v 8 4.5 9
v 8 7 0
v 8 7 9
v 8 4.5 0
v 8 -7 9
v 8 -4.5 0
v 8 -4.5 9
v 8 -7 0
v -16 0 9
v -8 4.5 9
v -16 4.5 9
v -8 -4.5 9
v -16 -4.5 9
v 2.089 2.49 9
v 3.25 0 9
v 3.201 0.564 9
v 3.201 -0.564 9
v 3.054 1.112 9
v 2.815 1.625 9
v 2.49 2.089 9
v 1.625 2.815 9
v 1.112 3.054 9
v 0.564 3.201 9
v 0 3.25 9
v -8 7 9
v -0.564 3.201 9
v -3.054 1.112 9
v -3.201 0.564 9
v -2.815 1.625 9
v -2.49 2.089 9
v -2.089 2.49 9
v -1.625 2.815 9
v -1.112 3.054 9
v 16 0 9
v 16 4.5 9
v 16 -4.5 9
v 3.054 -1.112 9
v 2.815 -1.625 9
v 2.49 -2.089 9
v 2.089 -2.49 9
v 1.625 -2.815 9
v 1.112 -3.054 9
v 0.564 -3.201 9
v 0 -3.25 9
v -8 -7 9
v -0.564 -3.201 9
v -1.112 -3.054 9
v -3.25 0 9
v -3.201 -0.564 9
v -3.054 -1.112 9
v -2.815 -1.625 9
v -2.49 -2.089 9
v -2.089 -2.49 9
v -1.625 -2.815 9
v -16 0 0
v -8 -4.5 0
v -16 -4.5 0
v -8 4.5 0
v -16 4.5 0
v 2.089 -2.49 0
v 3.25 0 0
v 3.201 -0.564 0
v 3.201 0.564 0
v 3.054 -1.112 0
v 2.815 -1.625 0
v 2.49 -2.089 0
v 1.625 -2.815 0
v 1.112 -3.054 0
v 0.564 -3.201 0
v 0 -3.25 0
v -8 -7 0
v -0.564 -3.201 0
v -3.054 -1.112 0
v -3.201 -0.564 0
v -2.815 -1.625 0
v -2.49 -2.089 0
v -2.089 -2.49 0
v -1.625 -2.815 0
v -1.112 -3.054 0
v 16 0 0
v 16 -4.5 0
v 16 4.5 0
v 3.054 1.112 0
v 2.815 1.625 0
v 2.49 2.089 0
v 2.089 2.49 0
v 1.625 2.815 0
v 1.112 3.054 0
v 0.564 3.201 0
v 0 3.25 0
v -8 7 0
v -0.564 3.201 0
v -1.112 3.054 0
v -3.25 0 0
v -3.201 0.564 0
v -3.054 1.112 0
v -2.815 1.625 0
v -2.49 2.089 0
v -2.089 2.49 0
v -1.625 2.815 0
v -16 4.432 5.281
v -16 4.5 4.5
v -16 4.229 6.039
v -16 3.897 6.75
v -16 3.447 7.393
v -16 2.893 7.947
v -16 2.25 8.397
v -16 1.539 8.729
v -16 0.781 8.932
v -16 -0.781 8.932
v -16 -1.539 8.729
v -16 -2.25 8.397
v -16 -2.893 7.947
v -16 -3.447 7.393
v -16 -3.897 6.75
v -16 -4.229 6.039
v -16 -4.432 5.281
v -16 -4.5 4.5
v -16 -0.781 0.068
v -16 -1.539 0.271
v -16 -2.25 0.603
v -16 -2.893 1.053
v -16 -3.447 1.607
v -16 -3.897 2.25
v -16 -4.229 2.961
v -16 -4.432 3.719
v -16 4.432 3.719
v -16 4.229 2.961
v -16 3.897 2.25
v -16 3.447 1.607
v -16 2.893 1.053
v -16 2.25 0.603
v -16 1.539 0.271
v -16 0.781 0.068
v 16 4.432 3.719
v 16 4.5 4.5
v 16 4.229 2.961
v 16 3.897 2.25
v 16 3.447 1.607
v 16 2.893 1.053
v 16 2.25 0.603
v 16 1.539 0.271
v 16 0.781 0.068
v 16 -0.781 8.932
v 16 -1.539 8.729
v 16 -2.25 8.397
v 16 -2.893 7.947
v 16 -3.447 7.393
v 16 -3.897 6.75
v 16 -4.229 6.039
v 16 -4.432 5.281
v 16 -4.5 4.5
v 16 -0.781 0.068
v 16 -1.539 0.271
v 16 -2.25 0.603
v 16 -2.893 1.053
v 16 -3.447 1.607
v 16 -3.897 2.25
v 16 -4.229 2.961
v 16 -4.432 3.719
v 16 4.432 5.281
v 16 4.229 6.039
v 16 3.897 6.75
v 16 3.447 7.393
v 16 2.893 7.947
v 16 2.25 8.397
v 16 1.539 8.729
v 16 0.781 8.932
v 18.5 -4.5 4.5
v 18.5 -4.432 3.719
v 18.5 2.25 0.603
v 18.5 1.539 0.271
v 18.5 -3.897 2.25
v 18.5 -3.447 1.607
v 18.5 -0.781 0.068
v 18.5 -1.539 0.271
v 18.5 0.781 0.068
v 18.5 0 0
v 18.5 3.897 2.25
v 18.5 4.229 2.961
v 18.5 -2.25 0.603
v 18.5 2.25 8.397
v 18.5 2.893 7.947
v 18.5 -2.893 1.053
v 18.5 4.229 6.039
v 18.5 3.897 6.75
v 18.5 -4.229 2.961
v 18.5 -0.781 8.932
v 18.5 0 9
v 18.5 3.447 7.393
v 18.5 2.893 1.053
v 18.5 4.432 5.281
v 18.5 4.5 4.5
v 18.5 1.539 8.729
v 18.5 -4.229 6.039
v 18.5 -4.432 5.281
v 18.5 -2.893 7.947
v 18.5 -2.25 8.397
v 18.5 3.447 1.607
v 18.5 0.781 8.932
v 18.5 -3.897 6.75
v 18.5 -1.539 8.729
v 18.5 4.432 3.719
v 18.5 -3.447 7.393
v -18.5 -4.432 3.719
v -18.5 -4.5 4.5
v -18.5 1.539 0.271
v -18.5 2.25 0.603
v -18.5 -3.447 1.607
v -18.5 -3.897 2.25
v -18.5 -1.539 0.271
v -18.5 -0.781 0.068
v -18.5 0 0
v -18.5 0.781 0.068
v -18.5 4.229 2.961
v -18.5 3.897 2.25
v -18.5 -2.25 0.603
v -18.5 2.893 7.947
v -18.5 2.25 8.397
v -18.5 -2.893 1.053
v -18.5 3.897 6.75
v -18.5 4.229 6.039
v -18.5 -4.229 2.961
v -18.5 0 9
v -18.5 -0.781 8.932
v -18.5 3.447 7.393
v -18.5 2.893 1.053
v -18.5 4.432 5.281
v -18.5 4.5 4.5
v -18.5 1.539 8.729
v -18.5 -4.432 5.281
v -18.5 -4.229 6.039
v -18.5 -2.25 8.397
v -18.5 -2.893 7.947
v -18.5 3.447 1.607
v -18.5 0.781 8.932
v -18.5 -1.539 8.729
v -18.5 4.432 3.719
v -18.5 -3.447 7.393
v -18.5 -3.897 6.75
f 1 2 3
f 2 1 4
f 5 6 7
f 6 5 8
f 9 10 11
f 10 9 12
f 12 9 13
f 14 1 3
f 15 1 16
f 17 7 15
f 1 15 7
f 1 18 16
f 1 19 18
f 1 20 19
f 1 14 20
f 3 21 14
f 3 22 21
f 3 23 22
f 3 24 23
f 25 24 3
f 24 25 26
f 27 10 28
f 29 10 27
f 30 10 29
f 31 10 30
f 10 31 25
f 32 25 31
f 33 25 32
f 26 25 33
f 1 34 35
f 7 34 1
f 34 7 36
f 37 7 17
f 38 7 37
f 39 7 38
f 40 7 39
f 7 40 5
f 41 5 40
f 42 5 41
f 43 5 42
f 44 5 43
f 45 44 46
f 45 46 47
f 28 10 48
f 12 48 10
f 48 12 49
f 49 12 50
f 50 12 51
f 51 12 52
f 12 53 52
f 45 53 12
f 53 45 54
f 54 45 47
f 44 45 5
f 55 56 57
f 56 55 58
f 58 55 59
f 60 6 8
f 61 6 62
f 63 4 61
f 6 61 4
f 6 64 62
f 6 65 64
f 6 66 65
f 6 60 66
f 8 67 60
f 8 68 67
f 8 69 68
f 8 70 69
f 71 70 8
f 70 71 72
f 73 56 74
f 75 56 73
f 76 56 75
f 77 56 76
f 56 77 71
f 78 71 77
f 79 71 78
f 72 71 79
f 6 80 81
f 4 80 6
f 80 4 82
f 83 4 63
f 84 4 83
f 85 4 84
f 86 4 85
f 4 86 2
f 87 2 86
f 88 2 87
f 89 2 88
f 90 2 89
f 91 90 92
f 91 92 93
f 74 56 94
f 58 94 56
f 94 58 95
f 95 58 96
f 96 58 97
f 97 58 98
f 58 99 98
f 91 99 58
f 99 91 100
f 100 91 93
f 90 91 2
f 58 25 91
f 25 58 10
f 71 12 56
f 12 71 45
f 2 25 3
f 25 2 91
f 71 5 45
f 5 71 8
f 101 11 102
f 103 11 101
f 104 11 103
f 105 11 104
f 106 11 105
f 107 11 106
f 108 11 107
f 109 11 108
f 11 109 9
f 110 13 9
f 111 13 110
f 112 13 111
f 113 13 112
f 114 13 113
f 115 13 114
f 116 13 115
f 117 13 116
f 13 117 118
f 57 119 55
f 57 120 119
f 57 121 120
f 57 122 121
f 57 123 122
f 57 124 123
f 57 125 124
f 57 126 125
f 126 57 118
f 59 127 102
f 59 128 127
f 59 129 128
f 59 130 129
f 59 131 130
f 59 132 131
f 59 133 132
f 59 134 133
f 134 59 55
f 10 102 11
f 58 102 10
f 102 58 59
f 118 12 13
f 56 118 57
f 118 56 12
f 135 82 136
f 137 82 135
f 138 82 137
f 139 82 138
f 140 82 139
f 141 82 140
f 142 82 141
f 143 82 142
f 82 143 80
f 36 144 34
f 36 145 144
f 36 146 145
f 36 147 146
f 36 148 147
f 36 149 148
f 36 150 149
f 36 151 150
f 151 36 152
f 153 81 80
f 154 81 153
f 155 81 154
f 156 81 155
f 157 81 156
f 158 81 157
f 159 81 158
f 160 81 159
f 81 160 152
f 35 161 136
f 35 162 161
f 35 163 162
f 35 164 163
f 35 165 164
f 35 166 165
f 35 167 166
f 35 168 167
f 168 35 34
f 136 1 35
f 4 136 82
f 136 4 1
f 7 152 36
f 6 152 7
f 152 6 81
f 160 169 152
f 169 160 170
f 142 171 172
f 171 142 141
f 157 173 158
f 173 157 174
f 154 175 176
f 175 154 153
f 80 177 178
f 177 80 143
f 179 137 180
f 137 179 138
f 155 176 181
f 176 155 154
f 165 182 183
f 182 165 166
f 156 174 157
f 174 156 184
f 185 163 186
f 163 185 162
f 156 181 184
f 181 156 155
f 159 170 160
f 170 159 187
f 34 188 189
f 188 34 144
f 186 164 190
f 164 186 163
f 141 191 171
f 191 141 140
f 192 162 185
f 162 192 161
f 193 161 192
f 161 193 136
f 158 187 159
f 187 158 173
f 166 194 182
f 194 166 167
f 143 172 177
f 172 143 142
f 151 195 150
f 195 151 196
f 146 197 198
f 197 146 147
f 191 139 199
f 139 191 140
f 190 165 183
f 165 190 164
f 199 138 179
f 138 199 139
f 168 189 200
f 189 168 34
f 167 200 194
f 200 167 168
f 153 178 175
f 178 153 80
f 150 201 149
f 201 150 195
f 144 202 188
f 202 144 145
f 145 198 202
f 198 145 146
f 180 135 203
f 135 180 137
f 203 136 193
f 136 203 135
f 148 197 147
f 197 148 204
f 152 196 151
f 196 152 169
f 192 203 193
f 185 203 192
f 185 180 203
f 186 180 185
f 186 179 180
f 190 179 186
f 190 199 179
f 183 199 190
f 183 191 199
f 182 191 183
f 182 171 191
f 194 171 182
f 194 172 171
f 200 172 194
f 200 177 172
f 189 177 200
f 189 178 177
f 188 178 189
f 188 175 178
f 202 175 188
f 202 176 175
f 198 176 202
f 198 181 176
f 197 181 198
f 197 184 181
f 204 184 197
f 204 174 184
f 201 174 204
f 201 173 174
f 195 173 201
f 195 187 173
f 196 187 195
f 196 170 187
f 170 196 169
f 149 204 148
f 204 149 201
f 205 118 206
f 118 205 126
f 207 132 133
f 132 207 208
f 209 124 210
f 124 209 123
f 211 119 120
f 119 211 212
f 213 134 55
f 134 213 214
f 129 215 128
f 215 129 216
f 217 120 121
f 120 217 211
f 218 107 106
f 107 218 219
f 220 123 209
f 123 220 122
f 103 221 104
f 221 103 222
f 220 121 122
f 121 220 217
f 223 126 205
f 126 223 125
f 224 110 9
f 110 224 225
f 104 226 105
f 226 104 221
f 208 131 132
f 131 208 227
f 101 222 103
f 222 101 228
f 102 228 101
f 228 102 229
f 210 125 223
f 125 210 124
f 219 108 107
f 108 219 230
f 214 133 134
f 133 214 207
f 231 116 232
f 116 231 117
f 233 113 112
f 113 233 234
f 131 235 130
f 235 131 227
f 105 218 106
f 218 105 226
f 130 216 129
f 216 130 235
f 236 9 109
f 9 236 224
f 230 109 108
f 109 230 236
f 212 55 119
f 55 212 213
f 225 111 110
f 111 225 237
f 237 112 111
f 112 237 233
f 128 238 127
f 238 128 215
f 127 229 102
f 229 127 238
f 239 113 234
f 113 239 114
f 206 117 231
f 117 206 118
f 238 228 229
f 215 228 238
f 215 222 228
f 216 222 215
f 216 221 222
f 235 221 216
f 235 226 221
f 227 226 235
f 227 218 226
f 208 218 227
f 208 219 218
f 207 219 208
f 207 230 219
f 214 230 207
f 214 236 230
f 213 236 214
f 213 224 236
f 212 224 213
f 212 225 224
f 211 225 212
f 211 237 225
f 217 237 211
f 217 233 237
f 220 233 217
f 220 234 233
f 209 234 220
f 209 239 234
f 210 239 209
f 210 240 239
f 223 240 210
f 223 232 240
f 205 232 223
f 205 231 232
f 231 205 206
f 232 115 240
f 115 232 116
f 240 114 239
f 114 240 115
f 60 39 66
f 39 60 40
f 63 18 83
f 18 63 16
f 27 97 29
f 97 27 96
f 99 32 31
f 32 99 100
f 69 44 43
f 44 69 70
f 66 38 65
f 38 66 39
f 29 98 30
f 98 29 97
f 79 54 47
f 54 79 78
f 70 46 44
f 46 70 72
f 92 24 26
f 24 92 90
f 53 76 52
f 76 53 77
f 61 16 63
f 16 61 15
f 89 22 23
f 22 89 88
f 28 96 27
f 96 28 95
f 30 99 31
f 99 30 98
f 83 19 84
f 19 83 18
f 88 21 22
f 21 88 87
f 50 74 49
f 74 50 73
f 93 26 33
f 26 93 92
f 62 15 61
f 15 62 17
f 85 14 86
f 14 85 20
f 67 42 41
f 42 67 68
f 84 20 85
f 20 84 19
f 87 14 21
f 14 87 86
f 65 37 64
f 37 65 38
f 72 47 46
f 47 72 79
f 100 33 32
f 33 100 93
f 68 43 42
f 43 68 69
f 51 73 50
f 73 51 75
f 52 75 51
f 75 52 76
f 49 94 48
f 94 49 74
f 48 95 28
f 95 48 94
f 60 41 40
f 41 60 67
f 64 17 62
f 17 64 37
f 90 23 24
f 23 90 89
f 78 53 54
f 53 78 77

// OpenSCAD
center_length = 16;
center_width = 14;
ends_length = 8;
pivot_radius = 4.5;
pivot_length = 2.5;
shaft_radius = 3.25;

ends_width = 2*pivot_radius;
center_thickness = pivot_radius*2;

difference()
{
	union()
	{
		translate([-1*center_length/2,-1*center_width/2,0])
			cube([center_length,center_width,center_thickness]);

		translate([-1*center_length,-1*ends_width/2,0])
			cube([ends_length,ends_width,center_thickness]);

		translate([center_length/2,-1*ends_width/2,0])
			cube([ends_length,ends_width,center_thickness]);

		translate([center_length/2+ends_length,0,pivot_radius])
			rotate(a=90, v=[0,1,0])
				cylinder(r=pivot_radius, h=pivot_length, $fn=36);

		translate([-1*(center_length/2+ends_length+pivot_length),0,pivot_radius])
			rotate(a=90, v=[0,1,0])
				cylinder(r=pivot_radius, h=pivot_length, $fn=36);
	}

	cylinder(r=shaft_radius, h=center_thickness, $fn=36);
}
